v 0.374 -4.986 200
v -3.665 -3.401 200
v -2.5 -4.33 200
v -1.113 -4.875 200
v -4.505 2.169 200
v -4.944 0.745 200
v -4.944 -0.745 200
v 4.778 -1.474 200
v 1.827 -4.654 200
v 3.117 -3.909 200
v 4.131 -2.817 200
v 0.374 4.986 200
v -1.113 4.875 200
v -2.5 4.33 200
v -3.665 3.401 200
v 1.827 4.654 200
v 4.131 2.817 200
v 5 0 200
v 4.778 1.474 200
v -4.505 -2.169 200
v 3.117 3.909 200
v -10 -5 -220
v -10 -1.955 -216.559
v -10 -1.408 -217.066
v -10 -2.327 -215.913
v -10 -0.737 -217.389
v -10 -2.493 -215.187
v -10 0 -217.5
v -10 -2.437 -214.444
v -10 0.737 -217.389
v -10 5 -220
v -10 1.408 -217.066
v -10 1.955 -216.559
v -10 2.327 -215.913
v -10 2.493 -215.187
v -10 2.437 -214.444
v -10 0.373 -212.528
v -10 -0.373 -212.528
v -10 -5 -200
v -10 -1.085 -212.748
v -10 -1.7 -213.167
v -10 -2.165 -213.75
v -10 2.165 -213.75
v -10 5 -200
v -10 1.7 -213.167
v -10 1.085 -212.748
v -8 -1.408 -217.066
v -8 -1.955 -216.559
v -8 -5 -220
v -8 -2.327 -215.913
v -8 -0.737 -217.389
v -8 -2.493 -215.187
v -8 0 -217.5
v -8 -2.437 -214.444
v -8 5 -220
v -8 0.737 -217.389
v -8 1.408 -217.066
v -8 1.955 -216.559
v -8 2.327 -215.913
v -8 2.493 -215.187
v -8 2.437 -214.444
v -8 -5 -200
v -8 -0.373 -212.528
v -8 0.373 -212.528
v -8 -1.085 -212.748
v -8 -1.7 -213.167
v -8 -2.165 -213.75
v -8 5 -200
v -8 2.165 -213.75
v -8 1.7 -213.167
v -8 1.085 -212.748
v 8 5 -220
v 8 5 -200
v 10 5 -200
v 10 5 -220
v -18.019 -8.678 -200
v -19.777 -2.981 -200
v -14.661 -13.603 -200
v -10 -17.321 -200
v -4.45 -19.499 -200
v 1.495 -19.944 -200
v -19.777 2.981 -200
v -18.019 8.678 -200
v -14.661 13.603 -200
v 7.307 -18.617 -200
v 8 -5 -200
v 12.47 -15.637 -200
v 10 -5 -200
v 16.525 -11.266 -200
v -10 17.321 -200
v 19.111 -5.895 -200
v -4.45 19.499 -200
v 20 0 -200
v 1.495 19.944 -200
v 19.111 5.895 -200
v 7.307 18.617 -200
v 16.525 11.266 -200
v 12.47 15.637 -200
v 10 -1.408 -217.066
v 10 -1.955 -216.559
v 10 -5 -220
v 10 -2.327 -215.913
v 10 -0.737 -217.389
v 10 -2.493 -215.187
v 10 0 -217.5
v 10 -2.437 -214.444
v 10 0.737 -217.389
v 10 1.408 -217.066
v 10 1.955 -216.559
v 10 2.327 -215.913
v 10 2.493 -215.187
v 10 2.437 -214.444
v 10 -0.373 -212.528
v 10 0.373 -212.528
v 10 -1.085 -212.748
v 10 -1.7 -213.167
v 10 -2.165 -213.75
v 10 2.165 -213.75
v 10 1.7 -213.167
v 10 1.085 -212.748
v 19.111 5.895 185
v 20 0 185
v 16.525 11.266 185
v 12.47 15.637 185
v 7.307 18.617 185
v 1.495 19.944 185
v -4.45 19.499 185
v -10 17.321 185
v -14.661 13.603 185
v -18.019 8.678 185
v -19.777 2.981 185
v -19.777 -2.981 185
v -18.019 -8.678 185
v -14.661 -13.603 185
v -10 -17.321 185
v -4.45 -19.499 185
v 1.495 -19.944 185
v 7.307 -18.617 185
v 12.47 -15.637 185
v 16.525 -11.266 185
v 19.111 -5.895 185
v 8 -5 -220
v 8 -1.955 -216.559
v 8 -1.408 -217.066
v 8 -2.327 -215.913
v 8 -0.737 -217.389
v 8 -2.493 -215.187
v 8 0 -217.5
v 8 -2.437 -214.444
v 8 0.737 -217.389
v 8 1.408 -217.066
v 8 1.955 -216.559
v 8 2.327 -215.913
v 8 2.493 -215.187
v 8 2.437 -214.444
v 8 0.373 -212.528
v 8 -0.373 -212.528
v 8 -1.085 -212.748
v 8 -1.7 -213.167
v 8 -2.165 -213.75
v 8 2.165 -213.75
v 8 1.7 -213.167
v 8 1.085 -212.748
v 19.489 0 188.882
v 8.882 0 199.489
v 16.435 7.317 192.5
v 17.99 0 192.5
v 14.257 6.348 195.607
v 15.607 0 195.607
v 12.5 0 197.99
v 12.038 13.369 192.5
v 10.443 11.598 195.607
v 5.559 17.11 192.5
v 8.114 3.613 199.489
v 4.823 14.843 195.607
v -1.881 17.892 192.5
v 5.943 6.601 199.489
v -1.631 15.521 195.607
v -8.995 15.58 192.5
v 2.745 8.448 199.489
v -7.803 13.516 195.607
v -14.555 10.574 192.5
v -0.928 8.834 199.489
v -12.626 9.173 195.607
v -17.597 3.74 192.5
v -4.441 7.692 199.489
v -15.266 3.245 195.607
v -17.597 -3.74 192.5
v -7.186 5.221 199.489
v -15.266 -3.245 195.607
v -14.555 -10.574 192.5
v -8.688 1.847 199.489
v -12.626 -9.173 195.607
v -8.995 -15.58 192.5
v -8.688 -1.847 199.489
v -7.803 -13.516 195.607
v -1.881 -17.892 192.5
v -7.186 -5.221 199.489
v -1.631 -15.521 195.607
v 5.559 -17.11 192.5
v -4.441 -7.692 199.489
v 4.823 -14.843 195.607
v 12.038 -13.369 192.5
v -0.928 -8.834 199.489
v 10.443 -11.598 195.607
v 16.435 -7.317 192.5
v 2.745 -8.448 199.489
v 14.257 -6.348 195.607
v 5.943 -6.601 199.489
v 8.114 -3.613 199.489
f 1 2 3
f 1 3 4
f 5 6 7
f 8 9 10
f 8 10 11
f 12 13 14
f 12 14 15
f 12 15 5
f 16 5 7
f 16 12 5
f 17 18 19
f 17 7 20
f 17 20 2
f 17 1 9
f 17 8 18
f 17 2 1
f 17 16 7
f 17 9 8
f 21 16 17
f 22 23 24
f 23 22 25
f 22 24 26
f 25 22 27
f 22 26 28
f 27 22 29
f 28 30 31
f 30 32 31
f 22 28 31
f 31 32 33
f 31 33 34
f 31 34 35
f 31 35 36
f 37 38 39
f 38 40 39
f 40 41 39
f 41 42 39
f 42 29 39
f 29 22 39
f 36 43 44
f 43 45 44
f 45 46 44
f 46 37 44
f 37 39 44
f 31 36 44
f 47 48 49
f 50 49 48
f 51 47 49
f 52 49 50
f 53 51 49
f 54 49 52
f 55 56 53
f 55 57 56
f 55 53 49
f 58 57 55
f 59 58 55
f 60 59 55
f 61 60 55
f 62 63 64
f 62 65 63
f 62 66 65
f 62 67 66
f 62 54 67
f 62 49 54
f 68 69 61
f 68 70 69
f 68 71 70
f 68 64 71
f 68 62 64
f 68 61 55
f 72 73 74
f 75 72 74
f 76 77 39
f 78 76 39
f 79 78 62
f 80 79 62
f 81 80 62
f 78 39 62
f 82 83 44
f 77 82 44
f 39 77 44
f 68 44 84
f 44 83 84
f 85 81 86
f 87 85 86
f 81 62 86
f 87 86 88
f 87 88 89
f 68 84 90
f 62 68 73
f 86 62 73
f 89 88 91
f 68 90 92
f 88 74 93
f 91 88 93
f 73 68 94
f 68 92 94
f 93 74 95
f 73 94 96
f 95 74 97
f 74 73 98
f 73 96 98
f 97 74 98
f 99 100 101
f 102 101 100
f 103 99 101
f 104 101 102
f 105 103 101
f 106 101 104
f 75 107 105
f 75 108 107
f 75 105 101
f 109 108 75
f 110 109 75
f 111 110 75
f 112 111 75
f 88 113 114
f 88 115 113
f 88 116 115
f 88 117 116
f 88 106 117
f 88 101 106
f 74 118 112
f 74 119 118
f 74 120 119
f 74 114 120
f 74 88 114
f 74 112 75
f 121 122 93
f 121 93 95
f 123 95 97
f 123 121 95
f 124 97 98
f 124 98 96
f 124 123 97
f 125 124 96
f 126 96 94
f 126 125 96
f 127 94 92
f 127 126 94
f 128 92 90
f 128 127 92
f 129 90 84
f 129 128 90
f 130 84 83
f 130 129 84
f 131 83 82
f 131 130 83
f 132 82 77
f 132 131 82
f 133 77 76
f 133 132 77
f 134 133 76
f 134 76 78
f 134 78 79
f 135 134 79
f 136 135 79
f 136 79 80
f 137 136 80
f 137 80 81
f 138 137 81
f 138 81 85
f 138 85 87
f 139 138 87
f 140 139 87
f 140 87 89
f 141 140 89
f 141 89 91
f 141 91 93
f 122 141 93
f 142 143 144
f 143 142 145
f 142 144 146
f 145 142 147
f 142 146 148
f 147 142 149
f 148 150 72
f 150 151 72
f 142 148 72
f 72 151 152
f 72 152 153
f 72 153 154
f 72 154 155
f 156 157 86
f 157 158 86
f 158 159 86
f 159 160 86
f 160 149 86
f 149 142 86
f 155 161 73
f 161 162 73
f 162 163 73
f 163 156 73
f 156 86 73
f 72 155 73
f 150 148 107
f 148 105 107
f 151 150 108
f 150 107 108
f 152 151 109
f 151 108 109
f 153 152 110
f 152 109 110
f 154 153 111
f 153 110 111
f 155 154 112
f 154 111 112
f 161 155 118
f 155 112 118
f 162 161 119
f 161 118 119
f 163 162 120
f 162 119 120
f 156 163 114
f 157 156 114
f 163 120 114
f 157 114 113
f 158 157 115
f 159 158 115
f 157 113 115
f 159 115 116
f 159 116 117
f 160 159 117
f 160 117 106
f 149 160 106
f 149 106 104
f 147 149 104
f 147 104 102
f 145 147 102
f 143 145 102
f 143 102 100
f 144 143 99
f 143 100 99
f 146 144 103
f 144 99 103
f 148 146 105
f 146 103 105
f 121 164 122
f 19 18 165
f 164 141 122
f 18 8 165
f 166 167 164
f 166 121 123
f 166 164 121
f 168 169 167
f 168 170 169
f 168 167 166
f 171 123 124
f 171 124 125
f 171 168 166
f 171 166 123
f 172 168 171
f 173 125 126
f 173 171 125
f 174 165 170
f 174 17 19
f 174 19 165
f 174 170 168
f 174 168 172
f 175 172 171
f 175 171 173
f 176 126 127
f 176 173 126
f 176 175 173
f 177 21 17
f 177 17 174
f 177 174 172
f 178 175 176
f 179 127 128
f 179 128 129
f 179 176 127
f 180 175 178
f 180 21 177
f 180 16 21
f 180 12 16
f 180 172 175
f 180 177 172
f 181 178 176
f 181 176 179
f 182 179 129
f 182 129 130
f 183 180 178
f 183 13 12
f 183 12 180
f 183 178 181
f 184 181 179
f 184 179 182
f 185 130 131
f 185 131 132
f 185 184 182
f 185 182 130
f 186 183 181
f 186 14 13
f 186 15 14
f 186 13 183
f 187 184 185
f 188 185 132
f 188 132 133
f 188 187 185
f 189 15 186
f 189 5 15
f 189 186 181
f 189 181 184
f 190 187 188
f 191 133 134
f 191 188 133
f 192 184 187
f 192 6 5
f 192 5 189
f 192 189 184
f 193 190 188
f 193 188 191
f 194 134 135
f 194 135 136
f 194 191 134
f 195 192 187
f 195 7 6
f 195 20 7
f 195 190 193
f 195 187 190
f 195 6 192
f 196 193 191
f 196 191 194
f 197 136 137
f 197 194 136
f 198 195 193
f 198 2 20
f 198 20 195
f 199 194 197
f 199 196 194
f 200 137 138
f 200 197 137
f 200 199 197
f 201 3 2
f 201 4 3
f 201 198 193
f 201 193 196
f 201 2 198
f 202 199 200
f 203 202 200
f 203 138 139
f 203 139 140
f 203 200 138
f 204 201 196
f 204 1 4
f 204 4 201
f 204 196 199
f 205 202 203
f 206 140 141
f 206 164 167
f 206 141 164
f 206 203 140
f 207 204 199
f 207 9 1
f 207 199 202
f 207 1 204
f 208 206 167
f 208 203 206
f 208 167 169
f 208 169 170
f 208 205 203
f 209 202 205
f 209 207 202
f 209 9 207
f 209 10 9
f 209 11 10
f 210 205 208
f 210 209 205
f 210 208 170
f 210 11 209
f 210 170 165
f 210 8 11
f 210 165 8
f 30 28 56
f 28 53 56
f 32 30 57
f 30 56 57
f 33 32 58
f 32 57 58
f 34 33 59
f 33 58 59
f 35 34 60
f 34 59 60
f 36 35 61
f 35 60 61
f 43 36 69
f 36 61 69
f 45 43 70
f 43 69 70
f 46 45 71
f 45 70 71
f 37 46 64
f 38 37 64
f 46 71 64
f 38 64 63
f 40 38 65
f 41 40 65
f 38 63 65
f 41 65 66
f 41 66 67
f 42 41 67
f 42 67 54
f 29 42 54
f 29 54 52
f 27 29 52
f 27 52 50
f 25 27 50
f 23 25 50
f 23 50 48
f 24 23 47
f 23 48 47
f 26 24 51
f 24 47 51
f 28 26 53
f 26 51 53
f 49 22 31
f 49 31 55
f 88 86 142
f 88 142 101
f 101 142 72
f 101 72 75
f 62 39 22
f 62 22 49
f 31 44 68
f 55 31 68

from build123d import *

# Parameters (mm, degrees)
SKETCH1_R           = 20
BOSS_EXTRUDE1_DEPTH = 200
FILLET2_R           = 15
BOSS_EXTRUDE2_START = -200
SKETCH2_W           = 2
SKETCH2_H           = 10
BOSS_EXTRUDE2_DEPTH = 20
SKETCH3_R           = 2.5
CUT_EXTRUDE1_DEPTH  = 11


with BuildPart() as part:
    # Sketch1 → Boss-Extrude1 (new, symmetric)
    with BuildSketch(Plane.XY):
        Circle(SKETCH1_R)
    extrude(amount=BOSS_EXTRUDE1_DEPTH, both=True)

    # Fillet2
    fillet2_edges = [part.edges().sort_by_distance(p)[0] for p in [
        (-20, 0, 200),
    ]]
    fillet(fillet2_edges, radius=FILLET2_R)

    # Sketch2 → Boss-Extrude2 (add)
    with BuildSketch(Plane.XY.offset(BOSS_EXTRUDE2_START)):
        with Locations((-9, 0)):
            Rectangle(SKETCH2_W, SKETCH2_H)
        with Locations((9, 0)):
            Rectangle(SKETCH2_W, SKETCH2_H)
    extrude(amount=-BOSS_EXTRUDE2_DEPTH)

    # Sketch3 → Cut-Extrude1 (cut, symmetric)
    with BuildSketch(Plane(origin=(0, 0, 0), x_dir=(0, 0, -1), z_dir=(1, 0, 0))):
        with Locations((215, 0)):
            Circle(SKETCH3_R)
    extrude(amount=CUT_EXTRUDE1_DEPTH, both=True, mode=Mode.SUBTRACT)


solid = part.part
